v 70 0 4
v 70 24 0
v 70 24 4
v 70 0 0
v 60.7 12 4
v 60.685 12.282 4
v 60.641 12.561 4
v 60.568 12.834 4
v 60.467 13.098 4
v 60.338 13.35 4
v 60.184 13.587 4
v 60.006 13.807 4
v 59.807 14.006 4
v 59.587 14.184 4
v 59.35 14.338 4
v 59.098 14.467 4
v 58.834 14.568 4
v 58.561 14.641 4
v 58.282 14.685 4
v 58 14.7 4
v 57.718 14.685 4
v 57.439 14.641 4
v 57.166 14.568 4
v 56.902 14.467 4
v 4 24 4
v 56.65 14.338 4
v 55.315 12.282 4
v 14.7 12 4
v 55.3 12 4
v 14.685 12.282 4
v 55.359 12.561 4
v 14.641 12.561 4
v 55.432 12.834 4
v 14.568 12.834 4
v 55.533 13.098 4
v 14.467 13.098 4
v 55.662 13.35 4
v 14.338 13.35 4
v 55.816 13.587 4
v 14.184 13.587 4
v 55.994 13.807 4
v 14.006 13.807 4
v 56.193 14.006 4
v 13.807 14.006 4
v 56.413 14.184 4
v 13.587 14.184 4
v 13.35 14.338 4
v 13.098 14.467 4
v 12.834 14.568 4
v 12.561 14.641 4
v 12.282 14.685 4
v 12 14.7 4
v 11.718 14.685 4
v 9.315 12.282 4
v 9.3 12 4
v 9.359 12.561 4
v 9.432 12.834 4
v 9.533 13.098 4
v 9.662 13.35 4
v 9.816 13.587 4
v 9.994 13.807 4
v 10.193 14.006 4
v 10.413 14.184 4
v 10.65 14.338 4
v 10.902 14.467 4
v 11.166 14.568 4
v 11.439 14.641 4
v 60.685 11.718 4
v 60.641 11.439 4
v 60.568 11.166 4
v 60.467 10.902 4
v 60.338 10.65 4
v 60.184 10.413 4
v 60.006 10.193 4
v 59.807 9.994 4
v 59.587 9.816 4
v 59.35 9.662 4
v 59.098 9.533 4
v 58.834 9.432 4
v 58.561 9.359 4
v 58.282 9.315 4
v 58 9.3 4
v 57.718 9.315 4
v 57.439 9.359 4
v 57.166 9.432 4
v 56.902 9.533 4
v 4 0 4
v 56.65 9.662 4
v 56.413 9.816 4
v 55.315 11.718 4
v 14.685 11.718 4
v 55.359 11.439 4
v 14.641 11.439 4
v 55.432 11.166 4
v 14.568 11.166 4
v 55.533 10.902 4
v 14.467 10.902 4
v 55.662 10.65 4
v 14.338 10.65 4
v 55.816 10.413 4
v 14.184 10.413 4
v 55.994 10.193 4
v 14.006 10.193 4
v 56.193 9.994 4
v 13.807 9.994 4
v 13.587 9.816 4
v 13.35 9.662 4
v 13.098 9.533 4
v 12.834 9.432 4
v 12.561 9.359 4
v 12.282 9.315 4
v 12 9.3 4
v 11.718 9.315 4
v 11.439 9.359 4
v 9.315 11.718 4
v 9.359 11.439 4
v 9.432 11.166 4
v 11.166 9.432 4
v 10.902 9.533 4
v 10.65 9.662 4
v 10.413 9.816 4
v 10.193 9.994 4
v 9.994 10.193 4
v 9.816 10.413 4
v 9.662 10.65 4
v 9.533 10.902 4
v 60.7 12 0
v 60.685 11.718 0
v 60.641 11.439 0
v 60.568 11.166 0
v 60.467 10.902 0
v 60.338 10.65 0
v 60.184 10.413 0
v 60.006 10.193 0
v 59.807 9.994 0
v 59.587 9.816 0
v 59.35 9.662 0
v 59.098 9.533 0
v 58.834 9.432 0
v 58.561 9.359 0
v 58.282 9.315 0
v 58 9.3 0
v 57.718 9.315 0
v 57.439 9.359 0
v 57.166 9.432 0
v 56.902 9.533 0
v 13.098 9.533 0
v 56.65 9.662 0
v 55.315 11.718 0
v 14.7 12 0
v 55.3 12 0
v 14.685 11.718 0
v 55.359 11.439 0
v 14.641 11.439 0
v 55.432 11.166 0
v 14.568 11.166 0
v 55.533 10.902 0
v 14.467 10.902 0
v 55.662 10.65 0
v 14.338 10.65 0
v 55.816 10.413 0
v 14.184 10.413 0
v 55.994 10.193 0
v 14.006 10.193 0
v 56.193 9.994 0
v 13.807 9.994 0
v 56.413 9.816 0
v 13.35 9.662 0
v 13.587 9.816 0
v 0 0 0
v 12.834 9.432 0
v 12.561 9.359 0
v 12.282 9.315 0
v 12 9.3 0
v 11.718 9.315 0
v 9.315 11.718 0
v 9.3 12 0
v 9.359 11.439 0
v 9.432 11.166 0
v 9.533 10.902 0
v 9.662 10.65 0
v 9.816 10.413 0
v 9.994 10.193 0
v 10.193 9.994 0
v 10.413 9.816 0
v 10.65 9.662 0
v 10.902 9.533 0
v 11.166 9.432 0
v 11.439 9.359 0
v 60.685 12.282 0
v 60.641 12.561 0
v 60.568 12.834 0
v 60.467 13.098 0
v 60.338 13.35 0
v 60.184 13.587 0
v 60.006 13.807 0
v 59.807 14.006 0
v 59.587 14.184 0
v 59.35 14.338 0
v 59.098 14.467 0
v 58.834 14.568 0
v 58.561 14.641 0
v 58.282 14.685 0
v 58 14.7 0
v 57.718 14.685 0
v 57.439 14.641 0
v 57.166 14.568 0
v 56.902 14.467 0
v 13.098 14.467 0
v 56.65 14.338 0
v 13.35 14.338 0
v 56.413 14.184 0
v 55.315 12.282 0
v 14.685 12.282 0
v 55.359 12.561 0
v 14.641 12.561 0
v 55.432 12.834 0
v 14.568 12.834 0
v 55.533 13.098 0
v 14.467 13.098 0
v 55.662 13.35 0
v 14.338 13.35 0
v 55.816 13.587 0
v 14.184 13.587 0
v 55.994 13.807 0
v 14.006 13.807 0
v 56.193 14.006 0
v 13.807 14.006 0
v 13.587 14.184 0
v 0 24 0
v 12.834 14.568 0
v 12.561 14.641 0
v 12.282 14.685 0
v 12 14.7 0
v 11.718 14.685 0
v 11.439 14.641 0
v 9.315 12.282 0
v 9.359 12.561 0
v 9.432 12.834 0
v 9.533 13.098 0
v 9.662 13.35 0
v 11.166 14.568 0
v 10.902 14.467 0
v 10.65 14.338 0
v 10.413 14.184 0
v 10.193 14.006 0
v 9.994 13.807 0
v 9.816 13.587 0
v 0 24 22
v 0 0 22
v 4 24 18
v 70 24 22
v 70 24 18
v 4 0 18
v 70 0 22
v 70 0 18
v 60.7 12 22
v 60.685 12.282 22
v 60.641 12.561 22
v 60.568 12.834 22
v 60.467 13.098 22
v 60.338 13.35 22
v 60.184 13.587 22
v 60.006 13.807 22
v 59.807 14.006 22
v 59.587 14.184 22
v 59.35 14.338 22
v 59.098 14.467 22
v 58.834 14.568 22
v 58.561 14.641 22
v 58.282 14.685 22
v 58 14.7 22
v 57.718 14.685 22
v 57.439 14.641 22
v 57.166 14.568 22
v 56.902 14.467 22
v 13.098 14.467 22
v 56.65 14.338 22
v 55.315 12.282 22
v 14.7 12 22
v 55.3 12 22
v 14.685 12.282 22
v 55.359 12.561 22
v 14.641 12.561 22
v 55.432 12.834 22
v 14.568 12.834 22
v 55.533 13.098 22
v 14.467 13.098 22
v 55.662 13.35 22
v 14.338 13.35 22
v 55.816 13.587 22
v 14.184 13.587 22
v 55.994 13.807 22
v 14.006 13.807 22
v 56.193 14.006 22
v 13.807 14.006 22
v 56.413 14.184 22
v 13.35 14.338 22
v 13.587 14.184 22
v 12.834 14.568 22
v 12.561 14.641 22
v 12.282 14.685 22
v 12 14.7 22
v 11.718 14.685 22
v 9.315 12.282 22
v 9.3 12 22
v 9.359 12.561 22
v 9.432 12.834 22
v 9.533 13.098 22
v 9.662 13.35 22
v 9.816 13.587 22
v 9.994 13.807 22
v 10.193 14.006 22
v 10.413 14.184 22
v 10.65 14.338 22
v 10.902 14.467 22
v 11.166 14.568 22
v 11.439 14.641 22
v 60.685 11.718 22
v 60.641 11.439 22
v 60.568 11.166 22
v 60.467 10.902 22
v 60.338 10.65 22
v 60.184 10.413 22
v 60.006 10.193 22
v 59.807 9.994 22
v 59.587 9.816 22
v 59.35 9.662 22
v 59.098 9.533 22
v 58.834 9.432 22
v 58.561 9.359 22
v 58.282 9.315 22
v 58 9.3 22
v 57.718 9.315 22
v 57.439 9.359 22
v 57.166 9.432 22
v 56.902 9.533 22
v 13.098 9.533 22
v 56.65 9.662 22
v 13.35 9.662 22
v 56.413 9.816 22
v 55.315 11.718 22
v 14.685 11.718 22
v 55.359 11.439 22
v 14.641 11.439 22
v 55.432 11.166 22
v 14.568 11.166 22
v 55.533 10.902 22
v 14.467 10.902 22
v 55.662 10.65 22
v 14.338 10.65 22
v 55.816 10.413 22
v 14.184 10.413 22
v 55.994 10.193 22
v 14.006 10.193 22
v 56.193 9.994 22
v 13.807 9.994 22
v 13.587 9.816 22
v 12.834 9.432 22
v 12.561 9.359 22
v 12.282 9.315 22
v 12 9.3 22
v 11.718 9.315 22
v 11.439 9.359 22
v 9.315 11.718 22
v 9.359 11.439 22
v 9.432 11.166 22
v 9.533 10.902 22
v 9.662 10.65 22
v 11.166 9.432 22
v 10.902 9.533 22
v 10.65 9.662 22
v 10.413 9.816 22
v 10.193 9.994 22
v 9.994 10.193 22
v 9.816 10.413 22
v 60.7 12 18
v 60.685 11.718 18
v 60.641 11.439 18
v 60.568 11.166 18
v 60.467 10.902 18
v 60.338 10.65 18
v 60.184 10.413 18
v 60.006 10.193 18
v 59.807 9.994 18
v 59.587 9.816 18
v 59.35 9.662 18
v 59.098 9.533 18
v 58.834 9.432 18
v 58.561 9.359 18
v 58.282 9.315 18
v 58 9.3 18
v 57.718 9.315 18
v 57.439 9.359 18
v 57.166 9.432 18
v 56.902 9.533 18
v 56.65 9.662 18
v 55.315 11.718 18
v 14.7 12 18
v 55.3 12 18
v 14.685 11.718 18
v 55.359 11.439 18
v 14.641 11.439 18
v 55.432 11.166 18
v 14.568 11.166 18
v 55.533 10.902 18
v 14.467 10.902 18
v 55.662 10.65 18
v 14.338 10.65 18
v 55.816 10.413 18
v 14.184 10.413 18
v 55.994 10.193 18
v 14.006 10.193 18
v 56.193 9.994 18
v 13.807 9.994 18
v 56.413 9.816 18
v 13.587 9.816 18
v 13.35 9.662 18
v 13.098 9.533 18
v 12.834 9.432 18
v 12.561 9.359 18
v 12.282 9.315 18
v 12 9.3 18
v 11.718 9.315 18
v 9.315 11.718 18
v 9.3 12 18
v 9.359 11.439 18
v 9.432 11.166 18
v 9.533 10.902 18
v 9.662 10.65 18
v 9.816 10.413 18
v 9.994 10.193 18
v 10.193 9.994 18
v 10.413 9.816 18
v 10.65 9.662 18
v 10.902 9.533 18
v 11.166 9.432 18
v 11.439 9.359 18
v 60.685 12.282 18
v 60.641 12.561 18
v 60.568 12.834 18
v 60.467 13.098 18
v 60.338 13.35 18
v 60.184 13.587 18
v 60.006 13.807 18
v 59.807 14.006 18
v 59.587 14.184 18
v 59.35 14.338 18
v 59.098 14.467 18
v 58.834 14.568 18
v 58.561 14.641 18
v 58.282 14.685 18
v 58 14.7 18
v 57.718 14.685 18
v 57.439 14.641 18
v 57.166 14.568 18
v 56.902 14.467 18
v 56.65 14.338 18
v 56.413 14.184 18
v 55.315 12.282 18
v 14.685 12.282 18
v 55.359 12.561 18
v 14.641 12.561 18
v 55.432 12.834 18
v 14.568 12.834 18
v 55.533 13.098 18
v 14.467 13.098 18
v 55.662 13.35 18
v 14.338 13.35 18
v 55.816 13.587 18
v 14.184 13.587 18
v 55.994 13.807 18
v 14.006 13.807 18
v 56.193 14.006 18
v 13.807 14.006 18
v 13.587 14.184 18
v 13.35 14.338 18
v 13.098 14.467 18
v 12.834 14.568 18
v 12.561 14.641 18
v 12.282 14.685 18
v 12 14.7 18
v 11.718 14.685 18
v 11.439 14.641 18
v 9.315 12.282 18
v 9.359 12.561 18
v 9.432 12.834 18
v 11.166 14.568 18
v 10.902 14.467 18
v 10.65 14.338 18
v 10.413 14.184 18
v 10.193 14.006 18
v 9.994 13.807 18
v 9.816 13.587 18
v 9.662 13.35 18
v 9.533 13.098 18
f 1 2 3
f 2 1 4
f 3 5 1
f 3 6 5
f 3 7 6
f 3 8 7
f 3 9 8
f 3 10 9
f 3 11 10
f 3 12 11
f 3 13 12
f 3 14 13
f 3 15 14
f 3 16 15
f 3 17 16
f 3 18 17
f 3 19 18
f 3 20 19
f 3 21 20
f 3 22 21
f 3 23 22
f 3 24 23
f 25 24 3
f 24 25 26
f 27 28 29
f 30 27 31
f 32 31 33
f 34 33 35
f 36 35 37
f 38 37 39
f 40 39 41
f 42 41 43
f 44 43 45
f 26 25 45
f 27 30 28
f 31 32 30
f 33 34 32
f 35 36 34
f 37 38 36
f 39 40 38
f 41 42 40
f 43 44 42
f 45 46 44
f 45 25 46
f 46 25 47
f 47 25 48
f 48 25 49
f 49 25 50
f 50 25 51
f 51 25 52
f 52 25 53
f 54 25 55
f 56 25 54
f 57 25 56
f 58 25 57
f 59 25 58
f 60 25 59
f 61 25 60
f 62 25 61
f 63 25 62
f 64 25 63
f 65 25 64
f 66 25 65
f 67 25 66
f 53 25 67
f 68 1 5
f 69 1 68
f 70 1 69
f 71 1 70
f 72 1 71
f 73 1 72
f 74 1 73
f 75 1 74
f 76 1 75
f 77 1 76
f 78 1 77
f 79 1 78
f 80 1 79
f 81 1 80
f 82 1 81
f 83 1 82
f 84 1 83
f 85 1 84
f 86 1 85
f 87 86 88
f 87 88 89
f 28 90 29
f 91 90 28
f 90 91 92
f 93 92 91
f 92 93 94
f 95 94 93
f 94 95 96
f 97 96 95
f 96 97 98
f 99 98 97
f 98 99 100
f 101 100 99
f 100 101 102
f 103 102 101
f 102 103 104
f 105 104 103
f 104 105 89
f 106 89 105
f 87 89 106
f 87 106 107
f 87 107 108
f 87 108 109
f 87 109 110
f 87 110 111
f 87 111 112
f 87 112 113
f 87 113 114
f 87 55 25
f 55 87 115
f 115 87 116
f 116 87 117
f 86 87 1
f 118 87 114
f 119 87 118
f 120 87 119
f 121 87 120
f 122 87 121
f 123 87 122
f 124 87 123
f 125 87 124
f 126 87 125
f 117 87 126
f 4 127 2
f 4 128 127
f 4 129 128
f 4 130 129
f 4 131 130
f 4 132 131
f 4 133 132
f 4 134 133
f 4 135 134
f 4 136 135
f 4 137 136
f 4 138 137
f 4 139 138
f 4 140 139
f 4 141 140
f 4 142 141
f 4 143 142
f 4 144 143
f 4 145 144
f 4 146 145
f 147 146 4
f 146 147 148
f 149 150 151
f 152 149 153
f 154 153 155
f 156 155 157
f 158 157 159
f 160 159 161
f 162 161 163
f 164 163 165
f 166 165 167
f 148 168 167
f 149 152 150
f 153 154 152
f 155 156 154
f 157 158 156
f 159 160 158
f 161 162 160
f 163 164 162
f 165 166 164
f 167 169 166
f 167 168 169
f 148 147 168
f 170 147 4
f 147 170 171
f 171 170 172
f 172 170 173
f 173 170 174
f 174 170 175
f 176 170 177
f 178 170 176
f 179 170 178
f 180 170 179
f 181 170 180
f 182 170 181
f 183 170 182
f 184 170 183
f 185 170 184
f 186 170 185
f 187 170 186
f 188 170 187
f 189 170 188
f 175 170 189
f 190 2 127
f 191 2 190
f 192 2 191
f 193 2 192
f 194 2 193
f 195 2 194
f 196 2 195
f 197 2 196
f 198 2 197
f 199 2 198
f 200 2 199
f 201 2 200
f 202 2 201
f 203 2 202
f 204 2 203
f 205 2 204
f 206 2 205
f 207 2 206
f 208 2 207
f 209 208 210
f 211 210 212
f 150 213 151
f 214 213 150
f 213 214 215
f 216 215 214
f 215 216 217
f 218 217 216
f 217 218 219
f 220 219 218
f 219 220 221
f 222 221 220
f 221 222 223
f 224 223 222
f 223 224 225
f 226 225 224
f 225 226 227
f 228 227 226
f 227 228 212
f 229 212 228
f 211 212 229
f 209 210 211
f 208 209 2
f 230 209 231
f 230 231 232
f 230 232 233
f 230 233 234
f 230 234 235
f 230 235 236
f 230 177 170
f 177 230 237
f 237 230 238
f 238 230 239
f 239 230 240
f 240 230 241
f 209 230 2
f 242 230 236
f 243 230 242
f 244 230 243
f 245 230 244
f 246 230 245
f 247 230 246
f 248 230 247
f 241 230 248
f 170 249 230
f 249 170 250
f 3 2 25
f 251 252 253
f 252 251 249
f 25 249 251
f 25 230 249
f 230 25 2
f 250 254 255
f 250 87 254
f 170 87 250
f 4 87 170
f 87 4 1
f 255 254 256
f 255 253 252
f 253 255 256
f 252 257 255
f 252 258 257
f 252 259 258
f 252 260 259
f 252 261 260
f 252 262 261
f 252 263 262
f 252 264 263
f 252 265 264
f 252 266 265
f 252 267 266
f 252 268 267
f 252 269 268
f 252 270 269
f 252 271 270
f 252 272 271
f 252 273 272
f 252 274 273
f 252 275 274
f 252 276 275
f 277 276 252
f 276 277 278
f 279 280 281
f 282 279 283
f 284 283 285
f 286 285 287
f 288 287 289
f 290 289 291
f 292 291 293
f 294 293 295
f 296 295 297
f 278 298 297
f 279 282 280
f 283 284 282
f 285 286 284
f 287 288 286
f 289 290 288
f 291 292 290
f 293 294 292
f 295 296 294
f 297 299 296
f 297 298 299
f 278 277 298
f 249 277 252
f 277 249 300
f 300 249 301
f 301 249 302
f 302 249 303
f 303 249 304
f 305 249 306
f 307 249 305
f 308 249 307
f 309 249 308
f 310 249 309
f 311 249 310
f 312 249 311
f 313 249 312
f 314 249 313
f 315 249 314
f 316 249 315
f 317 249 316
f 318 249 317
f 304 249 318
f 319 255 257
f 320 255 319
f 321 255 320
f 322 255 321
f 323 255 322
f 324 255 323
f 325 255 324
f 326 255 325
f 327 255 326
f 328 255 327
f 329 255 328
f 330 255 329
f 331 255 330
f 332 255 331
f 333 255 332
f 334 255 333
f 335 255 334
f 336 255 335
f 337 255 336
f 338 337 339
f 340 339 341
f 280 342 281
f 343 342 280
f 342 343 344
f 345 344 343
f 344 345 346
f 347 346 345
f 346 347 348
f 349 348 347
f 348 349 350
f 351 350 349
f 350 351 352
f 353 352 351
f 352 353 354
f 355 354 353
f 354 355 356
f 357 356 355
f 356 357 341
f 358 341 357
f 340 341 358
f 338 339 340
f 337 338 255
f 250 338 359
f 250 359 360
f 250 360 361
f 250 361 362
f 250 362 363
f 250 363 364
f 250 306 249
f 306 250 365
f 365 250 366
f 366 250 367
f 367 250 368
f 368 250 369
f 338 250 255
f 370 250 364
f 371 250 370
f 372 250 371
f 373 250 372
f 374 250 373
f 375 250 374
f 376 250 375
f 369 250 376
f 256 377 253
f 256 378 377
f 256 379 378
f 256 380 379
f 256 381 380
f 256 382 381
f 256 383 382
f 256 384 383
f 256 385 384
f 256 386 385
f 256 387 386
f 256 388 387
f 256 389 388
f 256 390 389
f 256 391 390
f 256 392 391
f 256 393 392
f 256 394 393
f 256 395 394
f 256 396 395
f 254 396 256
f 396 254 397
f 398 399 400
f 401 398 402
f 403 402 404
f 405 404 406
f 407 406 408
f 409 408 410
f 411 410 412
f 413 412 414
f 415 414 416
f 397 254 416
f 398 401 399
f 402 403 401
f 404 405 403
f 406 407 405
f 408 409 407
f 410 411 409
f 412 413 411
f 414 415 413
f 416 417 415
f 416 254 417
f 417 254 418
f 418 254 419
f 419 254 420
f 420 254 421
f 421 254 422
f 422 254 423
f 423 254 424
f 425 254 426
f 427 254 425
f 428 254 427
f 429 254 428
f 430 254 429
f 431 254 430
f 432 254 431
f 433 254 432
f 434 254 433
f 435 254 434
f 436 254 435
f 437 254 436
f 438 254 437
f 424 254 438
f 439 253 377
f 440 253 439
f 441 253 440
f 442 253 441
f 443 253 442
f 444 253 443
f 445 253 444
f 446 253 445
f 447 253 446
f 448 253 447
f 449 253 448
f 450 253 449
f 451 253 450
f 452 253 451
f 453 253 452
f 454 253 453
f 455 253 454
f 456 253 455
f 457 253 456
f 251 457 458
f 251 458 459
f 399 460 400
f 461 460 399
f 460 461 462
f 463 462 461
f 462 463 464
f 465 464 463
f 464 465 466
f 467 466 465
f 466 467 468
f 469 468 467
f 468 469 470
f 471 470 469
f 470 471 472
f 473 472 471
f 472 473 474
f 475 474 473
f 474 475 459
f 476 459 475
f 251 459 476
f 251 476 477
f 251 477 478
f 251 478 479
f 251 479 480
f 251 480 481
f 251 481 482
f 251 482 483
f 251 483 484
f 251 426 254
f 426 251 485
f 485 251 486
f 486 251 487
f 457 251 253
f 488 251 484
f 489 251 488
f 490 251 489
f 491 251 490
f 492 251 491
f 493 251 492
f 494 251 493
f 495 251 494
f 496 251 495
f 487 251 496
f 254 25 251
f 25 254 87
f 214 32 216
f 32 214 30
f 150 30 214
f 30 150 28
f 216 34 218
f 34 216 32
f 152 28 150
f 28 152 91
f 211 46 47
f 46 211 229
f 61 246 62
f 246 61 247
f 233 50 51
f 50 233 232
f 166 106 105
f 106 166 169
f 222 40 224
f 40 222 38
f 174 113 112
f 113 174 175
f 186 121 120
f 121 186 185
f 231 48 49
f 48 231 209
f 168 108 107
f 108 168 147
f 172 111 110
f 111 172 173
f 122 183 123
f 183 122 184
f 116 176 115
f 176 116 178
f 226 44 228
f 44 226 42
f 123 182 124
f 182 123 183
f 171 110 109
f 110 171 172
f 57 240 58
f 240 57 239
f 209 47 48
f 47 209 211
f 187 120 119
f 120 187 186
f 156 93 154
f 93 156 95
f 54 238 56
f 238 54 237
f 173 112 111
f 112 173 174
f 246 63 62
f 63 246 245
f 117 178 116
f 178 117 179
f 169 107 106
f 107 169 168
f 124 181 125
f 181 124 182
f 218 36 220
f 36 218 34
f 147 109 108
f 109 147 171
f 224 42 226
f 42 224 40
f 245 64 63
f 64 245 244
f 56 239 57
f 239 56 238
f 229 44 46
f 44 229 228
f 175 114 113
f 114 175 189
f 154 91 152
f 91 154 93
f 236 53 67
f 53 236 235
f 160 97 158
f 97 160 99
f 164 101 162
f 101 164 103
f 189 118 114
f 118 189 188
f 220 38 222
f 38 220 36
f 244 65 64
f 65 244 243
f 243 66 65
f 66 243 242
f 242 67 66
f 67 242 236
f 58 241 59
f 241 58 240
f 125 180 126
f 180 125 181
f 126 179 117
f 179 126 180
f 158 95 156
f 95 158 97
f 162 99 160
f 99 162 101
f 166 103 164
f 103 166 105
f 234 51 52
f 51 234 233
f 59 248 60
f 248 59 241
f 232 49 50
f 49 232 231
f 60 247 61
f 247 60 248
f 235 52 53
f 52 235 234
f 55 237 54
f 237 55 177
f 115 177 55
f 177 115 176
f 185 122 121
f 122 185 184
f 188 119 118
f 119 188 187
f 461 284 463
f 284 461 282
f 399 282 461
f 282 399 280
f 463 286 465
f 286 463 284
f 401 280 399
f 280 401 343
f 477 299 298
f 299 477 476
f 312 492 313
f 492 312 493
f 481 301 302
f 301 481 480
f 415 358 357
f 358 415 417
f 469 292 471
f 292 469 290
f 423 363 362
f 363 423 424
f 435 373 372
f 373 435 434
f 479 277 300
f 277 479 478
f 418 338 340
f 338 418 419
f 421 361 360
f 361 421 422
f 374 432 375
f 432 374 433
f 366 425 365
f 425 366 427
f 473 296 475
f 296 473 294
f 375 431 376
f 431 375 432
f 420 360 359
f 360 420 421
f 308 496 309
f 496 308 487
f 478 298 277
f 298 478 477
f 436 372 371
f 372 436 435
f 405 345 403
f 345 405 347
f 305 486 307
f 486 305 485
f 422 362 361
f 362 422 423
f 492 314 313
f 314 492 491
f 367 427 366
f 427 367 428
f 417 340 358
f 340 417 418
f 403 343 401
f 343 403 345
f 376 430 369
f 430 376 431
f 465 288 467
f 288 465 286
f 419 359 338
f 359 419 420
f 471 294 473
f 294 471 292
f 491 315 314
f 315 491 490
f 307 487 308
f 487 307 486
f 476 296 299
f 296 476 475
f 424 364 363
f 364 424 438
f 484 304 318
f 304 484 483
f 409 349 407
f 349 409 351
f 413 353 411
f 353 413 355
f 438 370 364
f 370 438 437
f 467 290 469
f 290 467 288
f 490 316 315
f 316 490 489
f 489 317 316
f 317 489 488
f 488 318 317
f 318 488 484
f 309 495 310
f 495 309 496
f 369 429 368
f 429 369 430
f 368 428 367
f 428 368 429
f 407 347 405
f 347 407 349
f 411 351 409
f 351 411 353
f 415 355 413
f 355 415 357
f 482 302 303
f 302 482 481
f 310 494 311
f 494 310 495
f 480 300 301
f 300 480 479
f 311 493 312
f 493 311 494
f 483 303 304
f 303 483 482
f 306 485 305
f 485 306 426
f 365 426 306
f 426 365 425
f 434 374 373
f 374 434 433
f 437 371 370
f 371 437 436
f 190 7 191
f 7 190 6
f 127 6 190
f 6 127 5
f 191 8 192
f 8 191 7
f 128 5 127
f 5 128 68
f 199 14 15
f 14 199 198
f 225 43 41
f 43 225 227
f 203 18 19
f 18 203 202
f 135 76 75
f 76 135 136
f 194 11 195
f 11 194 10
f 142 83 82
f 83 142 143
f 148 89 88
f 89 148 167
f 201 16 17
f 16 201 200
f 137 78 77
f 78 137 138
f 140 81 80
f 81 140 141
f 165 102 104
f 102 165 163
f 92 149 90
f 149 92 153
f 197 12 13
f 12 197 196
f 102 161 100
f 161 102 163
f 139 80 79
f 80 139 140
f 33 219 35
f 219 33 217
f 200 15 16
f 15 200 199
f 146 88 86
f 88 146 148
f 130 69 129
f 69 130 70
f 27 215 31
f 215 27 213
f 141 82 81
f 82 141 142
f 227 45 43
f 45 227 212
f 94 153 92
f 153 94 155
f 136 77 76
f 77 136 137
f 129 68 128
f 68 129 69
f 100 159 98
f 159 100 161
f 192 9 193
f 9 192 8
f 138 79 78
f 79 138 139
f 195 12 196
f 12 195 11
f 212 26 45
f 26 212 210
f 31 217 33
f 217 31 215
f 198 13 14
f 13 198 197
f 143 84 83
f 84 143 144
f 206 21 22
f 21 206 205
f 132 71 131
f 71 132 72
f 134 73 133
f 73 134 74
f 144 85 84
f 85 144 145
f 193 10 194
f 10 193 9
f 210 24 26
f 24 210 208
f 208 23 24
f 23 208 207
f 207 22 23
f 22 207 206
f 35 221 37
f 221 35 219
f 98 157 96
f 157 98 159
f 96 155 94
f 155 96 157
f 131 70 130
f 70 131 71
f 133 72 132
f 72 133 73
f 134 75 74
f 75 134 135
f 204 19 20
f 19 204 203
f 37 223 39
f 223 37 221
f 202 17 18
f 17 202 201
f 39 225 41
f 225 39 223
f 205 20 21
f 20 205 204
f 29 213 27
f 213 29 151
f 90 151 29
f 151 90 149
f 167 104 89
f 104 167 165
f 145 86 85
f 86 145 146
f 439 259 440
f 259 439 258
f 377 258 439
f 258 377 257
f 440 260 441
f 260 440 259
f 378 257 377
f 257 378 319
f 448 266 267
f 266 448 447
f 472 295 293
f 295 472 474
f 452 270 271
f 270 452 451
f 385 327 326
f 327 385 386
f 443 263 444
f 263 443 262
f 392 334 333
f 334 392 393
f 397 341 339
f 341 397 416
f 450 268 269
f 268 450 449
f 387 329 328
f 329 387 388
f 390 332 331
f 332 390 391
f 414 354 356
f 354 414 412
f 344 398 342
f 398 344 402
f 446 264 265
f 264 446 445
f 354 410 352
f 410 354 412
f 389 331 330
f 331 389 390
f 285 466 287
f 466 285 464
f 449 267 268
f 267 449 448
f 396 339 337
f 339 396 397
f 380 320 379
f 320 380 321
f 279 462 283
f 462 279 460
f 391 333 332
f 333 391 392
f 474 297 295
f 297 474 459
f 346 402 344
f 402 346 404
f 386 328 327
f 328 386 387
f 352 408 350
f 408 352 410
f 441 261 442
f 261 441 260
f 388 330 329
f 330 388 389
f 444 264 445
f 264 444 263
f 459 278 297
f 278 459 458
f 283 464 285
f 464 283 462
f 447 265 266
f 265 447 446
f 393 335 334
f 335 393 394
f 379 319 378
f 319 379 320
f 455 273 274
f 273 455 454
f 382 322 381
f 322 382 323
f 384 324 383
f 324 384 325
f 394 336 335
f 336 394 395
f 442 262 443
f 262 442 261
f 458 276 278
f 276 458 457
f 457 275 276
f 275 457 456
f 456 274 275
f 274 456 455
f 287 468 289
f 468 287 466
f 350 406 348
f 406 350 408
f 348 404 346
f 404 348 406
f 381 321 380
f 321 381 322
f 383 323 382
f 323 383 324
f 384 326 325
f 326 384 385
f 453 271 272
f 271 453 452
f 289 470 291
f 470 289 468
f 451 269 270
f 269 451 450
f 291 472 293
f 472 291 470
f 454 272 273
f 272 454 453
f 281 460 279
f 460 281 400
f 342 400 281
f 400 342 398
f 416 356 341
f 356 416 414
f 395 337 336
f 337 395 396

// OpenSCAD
// Z-offset mounting bracket.
$fn = 60;
eps = 0.02;
length = 70;
height = 18;
width = 24;
thickness = 4;
difference() {
    union() {
        cube([length,width,thickness]);
        translate([0,0,height]) cube([length,width,thickness]);
        translate([0,0,thickness]) cube([thickness,width,height-thickness]);
    }
    for (x=[12,length-12]) {
        translate([x,width/2,-eps]) cylinder(d=5.4,h=thickness+2*eps);
        translate([x,width/2,height-eps]) cylinder(d=5.4,h=thickness+2*eps);
    }
}
